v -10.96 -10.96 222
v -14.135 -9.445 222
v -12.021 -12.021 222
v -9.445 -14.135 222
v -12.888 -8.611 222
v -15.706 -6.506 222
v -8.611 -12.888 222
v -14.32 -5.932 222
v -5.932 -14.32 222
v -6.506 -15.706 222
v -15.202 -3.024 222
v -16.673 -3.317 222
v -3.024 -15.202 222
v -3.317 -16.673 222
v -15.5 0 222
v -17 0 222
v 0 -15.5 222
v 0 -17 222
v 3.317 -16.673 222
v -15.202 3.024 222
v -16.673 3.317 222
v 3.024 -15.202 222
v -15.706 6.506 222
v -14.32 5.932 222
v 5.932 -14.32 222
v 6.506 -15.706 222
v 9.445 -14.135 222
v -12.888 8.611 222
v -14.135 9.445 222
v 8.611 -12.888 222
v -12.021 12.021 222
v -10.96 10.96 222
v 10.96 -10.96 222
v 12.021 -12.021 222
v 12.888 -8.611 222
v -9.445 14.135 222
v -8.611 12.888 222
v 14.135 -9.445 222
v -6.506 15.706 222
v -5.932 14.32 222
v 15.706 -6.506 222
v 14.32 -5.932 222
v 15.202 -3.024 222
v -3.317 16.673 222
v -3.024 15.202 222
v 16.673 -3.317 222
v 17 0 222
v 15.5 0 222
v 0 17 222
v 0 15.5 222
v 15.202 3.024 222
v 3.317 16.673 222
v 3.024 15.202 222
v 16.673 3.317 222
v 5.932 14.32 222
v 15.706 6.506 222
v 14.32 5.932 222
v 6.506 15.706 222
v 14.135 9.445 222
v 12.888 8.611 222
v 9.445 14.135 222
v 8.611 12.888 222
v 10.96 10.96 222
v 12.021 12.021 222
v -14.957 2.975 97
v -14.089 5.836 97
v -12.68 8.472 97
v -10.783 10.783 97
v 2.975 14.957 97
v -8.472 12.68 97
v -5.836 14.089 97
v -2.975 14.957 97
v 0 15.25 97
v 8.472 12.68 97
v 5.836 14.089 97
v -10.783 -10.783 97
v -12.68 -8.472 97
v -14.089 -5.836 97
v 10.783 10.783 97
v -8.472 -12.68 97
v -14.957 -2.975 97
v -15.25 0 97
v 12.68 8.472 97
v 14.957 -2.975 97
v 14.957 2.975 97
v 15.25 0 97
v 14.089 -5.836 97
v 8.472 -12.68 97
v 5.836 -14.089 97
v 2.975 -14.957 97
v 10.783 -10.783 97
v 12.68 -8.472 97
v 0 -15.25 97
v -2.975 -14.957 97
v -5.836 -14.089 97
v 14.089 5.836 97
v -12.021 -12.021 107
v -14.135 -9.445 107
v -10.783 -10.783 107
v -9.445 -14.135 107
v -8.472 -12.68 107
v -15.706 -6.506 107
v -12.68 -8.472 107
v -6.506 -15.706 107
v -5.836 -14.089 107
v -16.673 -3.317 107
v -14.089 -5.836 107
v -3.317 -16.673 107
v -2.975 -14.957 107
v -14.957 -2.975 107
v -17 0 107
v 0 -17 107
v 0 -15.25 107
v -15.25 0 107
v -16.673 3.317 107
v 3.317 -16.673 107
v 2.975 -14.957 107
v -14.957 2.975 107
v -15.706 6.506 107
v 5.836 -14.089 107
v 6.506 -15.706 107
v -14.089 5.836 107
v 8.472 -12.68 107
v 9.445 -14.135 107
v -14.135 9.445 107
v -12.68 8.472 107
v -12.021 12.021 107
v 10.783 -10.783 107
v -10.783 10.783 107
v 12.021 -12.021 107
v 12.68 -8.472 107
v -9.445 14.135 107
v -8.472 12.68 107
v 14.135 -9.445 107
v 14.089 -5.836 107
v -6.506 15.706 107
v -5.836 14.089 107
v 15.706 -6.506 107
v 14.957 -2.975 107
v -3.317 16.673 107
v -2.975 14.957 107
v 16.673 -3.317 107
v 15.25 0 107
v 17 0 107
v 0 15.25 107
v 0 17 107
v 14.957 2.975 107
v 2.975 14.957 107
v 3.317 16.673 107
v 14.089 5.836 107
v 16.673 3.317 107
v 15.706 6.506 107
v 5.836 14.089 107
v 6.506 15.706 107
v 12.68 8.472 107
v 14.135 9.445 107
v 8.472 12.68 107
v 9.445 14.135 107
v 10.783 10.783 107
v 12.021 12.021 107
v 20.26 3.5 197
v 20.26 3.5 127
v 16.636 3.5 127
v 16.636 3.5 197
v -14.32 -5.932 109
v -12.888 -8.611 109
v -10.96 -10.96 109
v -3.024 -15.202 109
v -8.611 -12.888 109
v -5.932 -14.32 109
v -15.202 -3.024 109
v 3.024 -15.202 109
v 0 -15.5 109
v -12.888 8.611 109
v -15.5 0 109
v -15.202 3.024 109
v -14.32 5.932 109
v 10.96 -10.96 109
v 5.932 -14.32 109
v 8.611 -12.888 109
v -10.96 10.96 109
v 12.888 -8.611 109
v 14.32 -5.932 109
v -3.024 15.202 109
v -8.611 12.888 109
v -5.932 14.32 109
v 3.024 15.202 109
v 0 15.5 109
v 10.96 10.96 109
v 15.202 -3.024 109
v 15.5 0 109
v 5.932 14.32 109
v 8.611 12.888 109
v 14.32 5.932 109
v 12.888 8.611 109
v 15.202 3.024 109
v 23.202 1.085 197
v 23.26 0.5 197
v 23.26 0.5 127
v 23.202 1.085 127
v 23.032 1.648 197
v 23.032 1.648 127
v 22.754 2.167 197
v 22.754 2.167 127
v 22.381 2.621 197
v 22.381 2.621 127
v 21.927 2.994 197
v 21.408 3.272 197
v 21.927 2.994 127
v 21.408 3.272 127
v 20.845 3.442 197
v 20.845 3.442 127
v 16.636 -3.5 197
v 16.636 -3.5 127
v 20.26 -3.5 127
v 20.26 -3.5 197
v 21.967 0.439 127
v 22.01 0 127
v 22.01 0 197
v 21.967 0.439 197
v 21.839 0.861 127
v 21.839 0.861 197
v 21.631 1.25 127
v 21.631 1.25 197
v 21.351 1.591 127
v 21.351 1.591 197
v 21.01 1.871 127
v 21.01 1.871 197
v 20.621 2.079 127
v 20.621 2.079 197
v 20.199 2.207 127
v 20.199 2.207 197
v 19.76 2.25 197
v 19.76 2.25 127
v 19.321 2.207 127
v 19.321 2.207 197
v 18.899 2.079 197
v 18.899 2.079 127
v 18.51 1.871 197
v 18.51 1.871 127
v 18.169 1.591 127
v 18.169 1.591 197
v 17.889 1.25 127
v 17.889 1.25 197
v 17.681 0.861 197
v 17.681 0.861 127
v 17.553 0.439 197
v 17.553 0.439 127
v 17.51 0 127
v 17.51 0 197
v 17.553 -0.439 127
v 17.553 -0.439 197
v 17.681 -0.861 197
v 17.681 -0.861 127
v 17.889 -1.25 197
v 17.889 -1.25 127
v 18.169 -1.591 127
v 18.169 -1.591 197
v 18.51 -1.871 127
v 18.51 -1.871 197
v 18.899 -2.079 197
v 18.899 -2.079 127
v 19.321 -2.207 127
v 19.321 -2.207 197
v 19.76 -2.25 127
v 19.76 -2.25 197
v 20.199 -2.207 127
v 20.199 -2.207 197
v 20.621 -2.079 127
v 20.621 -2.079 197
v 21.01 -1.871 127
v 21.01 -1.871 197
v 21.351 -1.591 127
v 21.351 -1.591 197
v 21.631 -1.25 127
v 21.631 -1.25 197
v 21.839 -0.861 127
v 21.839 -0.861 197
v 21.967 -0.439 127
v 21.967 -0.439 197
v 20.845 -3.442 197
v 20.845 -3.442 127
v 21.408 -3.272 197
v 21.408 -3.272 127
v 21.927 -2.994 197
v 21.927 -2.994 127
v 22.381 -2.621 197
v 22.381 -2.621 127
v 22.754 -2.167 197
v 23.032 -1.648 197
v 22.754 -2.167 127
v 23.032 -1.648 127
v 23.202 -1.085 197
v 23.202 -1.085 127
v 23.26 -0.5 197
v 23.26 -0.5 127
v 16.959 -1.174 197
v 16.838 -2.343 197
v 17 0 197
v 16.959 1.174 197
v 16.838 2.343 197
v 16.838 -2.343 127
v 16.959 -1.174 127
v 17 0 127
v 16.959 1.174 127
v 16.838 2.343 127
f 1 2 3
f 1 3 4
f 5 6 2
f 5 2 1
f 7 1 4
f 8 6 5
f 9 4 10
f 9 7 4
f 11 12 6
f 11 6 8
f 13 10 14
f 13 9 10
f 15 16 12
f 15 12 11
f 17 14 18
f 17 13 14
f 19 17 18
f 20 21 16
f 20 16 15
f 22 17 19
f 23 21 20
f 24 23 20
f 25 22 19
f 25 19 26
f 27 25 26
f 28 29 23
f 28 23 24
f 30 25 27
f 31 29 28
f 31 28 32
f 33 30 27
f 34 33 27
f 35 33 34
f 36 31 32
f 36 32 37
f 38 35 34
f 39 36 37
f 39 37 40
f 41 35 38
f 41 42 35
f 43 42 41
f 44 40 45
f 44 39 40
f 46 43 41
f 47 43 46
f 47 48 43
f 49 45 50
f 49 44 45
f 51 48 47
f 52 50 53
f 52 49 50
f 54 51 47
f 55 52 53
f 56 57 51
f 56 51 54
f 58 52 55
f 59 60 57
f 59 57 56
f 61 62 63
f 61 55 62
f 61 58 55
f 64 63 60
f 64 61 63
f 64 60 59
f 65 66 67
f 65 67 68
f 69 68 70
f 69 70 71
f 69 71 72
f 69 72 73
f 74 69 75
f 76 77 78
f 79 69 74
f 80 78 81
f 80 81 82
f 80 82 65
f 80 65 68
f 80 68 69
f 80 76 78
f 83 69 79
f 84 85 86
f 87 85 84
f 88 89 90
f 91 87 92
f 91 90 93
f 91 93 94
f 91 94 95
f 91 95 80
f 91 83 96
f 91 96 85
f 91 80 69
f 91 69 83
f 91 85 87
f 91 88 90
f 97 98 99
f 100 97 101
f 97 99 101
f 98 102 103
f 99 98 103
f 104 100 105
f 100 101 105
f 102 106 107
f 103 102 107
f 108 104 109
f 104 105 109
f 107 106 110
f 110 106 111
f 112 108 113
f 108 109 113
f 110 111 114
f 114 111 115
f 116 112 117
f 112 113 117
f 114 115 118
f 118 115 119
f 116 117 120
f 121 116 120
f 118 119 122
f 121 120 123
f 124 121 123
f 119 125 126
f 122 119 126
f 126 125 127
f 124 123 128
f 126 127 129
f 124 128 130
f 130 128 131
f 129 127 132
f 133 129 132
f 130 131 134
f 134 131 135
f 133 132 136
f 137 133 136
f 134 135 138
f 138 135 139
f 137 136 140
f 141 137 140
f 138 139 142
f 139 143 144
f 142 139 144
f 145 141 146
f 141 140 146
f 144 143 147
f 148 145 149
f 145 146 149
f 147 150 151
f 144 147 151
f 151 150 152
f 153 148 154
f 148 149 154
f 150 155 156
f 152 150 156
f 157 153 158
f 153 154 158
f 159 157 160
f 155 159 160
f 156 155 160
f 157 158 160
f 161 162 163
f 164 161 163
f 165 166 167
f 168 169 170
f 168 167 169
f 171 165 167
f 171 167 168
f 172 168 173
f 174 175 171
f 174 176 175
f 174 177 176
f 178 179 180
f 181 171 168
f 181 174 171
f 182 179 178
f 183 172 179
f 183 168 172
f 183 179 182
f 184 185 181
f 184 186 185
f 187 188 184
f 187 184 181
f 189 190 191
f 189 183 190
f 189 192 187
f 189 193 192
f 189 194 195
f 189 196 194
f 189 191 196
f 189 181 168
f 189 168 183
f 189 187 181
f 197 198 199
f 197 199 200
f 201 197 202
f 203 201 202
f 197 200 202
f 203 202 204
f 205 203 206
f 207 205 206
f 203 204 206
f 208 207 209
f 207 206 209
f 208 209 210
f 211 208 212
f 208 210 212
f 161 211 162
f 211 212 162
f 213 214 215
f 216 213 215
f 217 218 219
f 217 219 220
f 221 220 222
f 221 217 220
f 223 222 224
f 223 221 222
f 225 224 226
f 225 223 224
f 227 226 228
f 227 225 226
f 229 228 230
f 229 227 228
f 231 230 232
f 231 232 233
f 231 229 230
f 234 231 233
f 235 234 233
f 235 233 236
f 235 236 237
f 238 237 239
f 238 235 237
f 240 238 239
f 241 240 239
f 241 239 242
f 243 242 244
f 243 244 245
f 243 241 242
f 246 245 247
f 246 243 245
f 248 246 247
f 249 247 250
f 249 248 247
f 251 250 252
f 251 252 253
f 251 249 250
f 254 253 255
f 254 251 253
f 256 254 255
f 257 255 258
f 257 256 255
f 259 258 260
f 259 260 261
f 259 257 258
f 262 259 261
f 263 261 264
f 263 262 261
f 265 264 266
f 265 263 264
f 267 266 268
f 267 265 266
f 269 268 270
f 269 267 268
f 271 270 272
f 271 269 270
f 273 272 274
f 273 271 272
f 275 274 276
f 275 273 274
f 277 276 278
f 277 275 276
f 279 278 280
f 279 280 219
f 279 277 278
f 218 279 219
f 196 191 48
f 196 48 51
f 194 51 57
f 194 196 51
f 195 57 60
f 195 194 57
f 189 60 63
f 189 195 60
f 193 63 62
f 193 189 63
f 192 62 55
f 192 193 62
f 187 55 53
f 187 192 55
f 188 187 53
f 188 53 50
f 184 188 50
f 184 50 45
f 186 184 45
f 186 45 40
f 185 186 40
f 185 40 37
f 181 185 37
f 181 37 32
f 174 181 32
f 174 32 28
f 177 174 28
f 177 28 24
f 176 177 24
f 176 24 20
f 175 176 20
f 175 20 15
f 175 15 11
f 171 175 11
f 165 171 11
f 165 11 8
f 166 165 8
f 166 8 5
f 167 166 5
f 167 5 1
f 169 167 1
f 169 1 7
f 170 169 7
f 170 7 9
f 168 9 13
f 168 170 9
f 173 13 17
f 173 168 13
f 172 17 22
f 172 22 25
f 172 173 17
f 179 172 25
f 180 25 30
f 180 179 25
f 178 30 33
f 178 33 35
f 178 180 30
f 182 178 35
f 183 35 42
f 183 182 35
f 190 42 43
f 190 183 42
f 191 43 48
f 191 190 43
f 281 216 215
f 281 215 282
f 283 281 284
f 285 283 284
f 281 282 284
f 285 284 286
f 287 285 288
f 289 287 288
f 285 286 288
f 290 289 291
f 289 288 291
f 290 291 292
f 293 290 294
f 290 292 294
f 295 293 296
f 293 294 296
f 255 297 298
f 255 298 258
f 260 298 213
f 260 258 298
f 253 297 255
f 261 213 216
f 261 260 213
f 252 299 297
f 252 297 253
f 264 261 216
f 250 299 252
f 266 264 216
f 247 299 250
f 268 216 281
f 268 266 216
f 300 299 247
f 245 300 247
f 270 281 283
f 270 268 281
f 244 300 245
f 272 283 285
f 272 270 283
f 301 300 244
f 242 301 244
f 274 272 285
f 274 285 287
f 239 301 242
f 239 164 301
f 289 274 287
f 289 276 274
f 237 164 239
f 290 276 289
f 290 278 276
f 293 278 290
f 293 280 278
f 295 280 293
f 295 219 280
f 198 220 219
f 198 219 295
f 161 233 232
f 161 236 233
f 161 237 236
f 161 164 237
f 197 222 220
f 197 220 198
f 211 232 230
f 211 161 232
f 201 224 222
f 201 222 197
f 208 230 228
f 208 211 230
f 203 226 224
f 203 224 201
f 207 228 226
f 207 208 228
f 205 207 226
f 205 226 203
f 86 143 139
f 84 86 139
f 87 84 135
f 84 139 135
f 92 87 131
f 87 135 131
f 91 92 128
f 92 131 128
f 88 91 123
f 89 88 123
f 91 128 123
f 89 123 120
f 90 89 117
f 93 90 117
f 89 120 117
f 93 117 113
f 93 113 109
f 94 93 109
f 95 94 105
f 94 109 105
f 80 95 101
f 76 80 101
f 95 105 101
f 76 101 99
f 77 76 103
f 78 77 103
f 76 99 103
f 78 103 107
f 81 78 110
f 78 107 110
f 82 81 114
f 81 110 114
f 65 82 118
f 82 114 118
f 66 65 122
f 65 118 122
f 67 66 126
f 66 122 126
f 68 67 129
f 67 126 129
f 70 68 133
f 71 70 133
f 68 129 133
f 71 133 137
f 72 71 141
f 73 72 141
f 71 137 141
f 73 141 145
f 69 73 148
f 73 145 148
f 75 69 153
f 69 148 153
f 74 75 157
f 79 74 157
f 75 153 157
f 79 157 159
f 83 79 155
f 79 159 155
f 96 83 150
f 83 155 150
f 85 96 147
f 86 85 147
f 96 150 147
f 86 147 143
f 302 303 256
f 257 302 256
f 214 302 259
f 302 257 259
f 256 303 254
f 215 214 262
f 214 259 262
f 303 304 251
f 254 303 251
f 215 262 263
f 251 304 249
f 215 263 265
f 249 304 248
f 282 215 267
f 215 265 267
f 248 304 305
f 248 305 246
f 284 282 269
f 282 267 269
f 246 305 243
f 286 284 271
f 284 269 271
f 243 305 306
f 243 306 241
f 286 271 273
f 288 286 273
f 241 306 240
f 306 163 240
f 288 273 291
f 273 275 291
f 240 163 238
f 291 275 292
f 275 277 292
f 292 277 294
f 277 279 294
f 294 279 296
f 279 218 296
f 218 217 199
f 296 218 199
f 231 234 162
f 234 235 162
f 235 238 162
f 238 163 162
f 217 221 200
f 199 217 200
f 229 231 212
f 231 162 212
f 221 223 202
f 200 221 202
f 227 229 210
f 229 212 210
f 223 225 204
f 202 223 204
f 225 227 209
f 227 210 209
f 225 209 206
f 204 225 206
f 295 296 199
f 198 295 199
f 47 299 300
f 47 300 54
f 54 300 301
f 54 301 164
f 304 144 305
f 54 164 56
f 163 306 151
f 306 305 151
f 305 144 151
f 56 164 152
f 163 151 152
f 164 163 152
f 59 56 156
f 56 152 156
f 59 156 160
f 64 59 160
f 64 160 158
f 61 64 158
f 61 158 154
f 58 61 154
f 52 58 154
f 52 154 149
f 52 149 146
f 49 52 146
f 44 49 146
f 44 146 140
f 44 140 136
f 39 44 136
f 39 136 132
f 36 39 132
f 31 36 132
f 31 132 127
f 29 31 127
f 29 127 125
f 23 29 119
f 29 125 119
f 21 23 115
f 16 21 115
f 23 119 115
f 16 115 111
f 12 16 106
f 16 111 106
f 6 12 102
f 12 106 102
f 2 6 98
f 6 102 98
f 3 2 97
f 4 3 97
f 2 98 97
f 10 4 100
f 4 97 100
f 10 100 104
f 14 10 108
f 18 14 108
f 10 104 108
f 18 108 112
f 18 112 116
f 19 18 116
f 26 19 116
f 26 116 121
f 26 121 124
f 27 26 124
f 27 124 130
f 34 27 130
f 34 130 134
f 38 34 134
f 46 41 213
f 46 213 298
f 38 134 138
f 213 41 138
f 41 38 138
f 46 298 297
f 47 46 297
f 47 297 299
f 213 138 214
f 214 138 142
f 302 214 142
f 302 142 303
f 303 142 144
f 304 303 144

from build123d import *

# Parameters (mm, degrees)
F1_R     = 17
F1_R_2   = 15.5
F2_DEPTH = 115
F3_R     = 17
F4_DEPTH = 2
F5_R     = 15.25
F6_DEPTH = 10
F8_R     = 2.25
F9_DEPTH = 70


# Not quite as in the source:
# - a feature of the source that left no trace in its solid (it failed there, or was rolled back) is left out


with BuildPart() as f2:
    # F1 (on offset) → F2 (new body)
    with BuildSketch(Plane.XY.offset(107)):
        Circle(F1_R)
        Circle(F1_R_2, mode=Mode.SUBTRACT)
    extrude(amount=F2_DEPTH)

    # F3 (on offset) → F4 (join)
    with BuildSketch(Plane.XY.offset(107)):
        Circle(F3_R)
    extrude(amount=F4_DEPTH)

    # F5 (on face) → F6 (join)
    with BuildSketch(Plane(origin=(0, 0, 107), x_dir=(1, 0, 0), z_dir=(0, 0, -1))):
        Circle(F5_R)
    extrude(amount=F6_DEPTH)

    # F8 (on offset) → F9 (join)
    with BuildSketch(Plane.XY.offset(127)):
        with BuildLine():
            Line((20.2600458013, 3.5), (16.2600458013, 3.5))
            Line((16.2600458013, 3.5), (16.2600458013, -3.5))
            Line((16.2600458013, -3.5), (20.2600458013, -3.5))
            ThreePointArc((20.2600458013, -3.5), (22.3813661449, -2.6213203436), (23.2600458013, -0.5))
            Line((23.2600458013, -0.5), (23.2600458013, 0.5))
            ThreePointArc((23.2600458013, 0.5), (22.3813661449, 2.6213203436), (20.2600458013, 3.5))
        make_face()
        with Locations((19.7600458013, 0)):
            Circle(F8_R, mode=Mode.SUBTRACT)
    extrude(amount=F9_DEPTH)


solid = f2.part
